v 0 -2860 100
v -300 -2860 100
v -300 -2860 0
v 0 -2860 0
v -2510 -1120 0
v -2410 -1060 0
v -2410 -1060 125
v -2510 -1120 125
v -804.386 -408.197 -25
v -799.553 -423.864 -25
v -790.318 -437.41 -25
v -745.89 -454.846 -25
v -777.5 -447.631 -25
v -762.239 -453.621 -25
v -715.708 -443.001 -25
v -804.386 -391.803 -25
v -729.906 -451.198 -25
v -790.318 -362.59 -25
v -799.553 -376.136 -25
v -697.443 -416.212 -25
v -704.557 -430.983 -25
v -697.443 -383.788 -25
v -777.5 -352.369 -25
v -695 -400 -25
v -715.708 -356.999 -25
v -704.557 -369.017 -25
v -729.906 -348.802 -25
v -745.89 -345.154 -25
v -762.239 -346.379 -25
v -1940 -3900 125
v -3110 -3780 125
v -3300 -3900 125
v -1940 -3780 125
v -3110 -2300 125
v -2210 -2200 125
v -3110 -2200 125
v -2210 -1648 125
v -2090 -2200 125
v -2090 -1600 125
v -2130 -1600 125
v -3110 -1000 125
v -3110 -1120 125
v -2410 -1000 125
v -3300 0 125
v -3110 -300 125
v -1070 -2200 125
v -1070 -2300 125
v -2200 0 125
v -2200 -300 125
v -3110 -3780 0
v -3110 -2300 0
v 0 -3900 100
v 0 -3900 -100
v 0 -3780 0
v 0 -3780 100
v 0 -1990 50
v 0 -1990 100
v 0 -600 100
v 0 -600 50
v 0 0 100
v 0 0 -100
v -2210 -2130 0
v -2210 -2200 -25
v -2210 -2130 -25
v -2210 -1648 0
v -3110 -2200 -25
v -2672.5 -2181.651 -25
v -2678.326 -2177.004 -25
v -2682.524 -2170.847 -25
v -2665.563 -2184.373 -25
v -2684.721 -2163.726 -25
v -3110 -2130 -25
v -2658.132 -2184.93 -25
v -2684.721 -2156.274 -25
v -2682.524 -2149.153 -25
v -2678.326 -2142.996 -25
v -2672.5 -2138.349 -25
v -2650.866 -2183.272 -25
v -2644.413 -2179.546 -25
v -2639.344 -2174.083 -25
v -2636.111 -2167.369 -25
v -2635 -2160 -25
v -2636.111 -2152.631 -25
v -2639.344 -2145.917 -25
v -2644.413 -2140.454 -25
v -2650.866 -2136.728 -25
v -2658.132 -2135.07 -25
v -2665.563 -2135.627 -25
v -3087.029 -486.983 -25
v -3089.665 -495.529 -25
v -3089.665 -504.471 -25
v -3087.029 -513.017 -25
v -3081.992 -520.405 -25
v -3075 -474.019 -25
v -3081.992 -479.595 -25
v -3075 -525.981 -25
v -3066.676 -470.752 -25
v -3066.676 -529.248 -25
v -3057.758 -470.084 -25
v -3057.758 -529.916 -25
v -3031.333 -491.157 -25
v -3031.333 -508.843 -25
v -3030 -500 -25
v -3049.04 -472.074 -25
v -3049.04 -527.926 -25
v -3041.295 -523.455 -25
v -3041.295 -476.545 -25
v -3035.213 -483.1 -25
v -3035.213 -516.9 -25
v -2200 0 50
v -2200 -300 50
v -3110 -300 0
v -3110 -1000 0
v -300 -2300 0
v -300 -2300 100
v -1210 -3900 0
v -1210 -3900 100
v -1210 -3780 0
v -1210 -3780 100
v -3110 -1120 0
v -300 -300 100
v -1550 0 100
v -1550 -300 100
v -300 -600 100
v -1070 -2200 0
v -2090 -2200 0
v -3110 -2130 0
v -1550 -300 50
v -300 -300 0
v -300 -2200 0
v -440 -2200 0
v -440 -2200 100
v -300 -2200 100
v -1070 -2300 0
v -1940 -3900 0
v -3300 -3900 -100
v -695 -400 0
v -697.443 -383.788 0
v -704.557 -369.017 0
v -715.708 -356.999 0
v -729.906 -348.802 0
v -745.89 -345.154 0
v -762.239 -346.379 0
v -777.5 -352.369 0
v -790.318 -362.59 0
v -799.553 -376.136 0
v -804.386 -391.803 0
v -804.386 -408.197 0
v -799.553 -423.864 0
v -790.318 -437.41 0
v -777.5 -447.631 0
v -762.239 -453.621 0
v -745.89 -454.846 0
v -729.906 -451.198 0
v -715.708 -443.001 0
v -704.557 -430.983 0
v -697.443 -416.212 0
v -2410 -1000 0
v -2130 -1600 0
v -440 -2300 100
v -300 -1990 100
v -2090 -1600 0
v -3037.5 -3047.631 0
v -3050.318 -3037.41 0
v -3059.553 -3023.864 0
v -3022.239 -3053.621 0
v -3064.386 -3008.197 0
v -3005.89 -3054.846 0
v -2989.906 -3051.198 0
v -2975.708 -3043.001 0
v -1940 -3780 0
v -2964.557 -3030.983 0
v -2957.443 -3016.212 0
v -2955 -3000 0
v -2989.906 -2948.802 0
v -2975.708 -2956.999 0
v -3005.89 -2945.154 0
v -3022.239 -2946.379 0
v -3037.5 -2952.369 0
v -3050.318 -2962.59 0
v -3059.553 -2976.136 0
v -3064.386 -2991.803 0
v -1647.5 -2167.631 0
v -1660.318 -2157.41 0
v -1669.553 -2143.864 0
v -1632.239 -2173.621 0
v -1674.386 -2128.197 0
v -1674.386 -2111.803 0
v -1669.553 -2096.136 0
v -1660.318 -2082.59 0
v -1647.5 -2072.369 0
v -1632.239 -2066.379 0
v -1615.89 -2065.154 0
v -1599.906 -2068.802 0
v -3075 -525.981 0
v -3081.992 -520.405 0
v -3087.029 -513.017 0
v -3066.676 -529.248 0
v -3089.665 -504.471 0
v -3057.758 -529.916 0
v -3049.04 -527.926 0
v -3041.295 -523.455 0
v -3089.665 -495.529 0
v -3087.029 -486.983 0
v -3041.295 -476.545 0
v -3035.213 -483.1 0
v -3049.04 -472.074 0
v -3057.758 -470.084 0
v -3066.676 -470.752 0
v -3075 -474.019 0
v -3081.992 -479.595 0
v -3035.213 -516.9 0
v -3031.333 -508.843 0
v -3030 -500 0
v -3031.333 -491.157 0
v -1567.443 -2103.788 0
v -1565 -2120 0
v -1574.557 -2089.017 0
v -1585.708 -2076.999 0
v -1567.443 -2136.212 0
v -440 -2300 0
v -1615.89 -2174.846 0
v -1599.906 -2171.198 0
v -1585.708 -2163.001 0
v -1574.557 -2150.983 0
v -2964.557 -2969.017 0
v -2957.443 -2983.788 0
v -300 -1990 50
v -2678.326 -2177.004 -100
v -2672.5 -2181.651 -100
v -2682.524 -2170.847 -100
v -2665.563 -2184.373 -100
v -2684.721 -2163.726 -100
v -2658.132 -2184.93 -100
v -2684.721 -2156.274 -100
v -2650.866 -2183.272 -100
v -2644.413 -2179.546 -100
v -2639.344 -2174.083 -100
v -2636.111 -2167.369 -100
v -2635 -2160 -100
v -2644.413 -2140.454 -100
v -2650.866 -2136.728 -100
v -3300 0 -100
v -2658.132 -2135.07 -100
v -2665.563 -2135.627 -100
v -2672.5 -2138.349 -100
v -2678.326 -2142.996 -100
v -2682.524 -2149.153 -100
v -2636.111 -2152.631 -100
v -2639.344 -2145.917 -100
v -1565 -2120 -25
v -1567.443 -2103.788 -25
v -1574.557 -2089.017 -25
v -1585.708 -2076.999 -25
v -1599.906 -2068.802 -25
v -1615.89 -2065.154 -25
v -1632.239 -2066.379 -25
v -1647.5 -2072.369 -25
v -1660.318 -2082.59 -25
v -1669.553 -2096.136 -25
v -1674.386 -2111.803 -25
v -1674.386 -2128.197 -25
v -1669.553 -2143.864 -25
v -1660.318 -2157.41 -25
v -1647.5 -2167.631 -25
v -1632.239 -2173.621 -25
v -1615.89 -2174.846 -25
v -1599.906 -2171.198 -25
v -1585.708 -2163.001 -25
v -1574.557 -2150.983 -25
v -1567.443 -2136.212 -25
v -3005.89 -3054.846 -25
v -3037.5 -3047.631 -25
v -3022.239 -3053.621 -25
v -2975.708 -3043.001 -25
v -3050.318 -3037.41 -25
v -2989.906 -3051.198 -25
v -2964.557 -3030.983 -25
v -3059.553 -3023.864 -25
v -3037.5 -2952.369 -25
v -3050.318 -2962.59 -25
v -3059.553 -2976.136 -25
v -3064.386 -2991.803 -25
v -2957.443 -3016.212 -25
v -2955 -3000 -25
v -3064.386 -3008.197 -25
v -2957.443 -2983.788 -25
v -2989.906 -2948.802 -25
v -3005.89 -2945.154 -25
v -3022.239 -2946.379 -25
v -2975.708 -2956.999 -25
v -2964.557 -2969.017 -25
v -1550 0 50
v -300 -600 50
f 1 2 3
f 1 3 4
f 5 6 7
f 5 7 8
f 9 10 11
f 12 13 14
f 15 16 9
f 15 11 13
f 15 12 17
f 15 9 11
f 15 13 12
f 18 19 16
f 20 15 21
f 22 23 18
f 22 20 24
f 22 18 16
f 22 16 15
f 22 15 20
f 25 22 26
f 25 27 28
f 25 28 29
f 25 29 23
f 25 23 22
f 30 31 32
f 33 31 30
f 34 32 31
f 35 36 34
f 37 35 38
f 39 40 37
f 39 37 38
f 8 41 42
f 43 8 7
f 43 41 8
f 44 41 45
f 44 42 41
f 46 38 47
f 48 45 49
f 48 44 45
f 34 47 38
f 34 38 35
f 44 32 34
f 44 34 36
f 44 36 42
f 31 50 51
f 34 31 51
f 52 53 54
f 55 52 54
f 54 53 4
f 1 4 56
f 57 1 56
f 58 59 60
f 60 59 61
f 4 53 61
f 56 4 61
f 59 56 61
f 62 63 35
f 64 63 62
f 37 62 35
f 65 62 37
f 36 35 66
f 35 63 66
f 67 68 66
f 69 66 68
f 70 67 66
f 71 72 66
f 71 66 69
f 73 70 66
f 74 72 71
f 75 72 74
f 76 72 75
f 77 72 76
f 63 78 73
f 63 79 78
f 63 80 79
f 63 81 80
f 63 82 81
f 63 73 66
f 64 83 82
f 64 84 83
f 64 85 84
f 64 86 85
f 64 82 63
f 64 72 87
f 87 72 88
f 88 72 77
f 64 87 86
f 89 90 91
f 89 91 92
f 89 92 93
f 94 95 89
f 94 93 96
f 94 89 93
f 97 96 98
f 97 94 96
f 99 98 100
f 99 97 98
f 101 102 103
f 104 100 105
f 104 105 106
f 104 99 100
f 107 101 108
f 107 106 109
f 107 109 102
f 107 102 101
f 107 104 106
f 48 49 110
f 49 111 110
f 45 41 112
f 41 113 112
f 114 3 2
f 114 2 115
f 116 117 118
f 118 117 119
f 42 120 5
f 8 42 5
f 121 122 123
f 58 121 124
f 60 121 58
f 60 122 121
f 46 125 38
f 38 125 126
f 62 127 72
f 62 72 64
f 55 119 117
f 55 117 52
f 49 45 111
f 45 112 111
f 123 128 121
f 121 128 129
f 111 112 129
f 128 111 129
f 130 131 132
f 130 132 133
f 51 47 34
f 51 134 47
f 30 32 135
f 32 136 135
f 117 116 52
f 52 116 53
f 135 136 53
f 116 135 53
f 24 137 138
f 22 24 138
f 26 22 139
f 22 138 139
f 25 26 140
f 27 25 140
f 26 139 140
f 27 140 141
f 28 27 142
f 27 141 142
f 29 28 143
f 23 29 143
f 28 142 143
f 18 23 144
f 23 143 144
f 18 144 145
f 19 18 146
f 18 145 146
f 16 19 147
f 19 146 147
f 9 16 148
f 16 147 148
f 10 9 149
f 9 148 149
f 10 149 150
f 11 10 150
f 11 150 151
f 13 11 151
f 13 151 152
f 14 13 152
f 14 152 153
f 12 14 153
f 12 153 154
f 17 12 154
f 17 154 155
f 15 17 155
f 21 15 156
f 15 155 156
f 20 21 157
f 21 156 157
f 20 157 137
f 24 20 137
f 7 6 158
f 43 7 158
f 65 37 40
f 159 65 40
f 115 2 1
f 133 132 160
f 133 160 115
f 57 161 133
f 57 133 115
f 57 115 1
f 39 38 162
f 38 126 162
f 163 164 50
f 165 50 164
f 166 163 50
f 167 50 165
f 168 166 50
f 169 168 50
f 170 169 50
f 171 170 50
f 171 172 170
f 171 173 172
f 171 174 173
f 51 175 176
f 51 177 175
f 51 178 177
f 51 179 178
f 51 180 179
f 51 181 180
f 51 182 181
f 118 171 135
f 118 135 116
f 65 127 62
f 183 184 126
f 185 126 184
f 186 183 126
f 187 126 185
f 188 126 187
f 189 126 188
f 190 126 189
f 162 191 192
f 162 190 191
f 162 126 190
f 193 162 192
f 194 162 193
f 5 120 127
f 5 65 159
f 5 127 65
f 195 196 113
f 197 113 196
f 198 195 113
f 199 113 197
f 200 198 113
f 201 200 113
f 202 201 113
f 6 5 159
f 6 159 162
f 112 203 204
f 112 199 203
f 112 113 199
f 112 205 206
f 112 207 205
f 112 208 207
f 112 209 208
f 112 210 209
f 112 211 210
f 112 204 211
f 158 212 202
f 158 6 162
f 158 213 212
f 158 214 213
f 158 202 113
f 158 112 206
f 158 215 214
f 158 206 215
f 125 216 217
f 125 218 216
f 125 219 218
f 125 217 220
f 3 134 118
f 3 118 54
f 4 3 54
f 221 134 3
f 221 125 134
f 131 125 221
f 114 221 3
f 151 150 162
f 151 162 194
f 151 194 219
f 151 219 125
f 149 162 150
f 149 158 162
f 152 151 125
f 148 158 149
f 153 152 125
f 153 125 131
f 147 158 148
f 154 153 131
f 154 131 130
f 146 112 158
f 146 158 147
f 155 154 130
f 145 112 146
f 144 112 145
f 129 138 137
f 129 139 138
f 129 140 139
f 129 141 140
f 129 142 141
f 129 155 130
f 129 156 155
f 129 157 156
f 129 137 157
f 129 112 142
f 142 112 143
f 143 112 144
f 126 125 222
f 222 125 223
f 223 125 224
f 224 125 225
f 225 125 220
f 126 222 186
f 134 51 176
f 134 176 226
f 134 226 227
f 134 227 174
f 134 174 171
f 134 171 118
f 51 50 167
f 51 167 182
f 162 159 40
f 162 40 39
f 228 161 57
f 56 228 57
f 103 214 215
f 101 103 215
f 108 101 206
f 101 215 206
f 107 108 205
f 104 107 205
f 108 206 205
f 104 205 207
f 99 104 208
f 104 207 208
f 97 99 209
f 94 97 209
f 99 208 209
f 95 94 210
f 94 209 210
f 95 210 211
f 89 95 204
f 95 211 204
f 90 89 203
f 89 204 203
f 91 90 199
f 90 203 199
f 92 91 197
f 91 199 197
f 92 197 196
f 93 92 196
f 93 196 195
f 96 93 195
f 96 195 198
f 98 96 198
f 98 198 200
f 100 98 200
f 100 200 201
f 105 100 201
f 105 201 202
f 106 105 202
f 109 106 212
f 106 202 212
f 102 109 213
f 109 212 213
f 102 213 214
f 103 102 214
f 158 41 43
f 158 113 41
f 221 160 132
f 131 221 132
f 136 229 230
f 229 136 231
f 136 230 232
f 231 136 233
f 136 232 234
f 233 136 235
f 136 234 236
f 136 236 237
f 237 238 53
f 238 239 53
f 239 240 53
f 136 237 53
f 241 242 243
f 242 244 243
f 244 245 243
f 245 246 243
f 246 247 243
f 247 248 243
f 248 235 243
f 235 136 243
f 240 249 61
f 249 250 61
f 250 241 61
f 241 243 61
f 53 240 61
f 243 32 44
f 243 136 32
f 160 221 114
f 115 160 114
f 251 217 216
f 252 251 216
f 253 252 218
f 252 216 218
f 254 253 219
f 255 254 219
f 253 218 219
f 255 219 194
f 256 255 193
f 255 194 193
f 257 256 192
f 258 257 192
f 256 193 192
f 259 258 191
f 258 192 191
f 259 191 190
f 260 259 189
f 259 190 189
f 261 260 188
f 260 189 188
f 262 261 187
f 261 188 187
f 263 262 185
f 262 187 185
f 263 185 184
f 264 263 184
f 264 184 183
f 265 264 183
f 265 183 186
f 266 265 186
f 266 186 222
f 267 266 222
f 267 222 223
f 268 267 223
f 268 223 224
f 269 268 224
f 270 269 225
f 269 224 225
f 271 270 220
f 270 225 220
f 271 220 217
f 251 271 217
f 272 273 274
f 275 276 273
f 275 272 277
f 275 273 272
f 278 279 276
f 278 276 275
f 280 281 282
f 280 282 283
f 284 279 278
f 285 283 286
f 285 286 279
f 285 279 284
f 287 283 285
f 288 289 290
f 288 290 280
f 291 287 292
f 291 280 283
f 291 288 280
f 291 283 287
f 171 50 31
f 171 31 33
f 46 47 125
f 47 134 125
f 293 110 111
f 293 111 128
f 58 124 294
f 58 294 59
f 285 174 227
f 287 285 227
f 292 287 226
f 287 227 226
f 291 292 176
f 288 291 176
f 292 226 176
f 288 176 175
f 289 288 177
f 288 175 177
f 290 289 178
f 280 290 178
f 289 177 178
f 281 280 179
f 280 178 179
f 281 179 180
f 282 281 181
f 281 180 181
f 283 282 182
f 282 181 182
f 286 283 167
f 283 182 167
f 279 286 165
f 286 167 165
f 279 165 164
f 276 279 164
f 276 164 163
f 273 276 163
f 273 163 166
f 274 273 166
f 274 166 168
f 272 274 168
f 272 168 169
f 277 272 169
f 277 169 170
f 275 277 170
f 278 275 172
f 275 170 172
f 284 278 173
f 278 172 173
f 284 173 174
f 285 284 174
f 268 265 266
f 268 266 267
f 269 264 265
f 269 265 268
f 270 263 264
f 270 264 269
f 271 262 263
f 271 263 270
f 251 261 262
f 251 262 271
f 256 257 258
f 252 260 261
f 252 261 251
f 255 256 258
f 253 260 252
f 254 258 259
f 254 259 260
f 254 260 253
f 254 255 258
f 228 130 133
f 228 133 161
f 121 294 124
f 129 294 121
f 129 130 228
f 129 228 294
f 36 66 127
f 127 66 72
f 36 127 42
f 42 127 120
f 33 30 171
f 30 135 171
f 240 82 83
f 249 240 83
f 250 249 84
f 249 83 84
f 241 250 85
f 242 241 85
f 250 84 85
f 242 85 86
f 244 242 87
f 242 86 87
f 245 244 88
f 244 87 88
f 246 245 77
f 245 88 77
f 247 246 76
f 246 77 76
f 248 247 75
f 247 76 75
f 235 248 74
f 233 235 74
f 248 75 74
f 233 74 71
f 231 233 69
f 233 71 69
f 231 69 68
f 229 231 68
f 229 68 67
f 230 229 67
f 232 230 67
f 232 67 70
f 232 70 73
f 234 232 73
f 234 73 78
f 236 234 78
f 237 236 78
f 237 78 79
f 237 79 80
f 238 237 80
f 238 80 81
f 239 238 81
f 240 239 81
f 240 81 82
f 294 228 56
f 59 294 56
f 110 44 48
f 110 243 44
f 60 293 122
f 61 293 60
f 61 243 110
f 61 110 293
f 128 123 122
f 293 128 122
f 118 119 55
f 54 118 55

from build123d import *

# Parameters (mm, degrees)
F0_W      = 3300
F0_H      = 3900
F1_DEPTH  = 100
F2_W      = 3300
F2_H      = 3900
F2_W_2    = 2810
F2_H_2    = 1480
F2_W_3    = 1560
F2_H_3    = 1900
F2_W_4    = 1150
F3_DEPTH  = 100
F4_W      = 630
F4_H      = 100
F4_W_2    = 300
F4_H_2    = 920
F4_W_3    = 730
F4_H_3    = 120
F5_DEPTH  = 100
F4_W_4    = 650
F4_H_4    = 300
F4_H_5    = 1390
F6_DEPTH  = 50
F7_W      = 100
F7_H      = 1900
F8_DEPTH  = 100
F9_W      = 630
F9_H      = 100
F10_DEPTH = 100
F11_W     = 700
F11_H     = 120
F12_DEPTH = 100
F13_W     = 120
F13_H     = 600
F14_DEPTH = 100
F15_DEPTH = 25
F17_DEPTH = 125
F18_R     = 55
F18_R_2   = 30
F18_W     = 900
F18_H     = 70
F19_DEPTH = 25
F20_R     = 25
F21_DEPTH = 100


with BuildPart() as f1:
    # F0 (on Top) → F1 (new body)
    with BuildSketch(Plane.XY):
        with Locations((-1650, -1950)):
            Rectangle(F0_W, F0_H)
    extrude(amount=-F1_DEPTH)

    # F2 (on face) → F3 (join)
    with BuildSketch(Plane.XY):
        with Locations((-1650, -1950)):
            Rectangle(F2_W, F2_H)
        with Locations((-1705, -3040)):
            Rectangle(F2_W_2, F2_H_2, mode=Mode.SUBTRACT)
        with Locations((-2330, -1250)):
            Rectangle(F2_W_3, F2_H_3, mode=Mode.SUBTRACT)
        with Locations((-875, -1250)):
            Rectangle(F2_W_4, F2_H_3, mode=Mode.SUBTRACT)
    extrude(amount=F3_DEPTH)

    # F4 (on face) → F5 (cut, through all)
    with BuildSketch(Plane.XY.offset(100)):
        with Locations((-2085, -2250)):
            Rectangle(F4_W, F4_H)
        with Locations((-755, -2250)):
            Rectangle(F4_W, F4_H)
        with Locations((-150, -3320)):
            Rectangle(F4_W_2, F4_H_2)
        with Locations((-1575, -3840)):
            Rectangle(F4_W_3, F4_H_3)
    extrude(amount=-F5_DEPTH, mode=Mode.SUBTRACT)

    # F4 (on face) → F6 (cut)
    with BuildSketch(Plane.XY.offset(100)):
        with Locations((-1875, -150)):
            Rectangle(F4_W_4, F4_H_4)
        with Locations((-150, -1295)):
            Rectangle(F4_W_2, F4_H_5)
    extrude(amount=-F6_DEPTH, mode=Mode.SUBTRACT)

    # F7 (on face) → F8 (cut, through all)
    with BuildSketch(Plane.XY.offset(100)):
        with Locations((-1500, -1250)):
            Rectangle(F7_W, F7_H)
    extrude(amount=-F8_DEPTH, mode=Mode.SUBTRACT)

    # F9 (on face) → F10 (join, through all)
    with BuildSketch(Plane.XY):
        with Locations((-2085, -2250)):
            Rectangle(F9_W, F9_H)
    extrude(amount=F10_DEPTH)

    # F11 (on face) → F12 (join, through all)
    with BuildSketch(Plane.XY):
        with Locations((-2760, -1060)):
            Rectangle(F11_W, F11_H)
    extrude(amount=F12_DEPTH)

    # F13 (on face) → F14 (join, through all)
    with BuildSketch(Plane.XY):
        with Locations((-2150, -1900)):
            Rectangle(F13_W, F13_H)
    extrude(amount=F14_DEPTH)

    # F15 (add): a face of the model
    f15_faces = [f1.faces().sort_by_distance(p)[0] for p in [
        (-2244.9253825805, -150, 100),
    ]]
    extrude(f15_faces, amount=F15_DEPTH)

    # F16 (on face) → F17 (cut, through all)
    with BuildSketch(Plane.XY.offset(125)):
        Polygon((-2410, -1120), (-2410, -1060), (-2510, -1120), align=None)
        Polygon((-2210, -1648), (-2130, -1600), (-2210, -1600), align=None)
    extrude(amount=-F17_DEPTH, mode=Mode.SUBTRACT)

    # F18 (on face) → F19 (cut)
    with BuildSketch(Plane.XY):
        with Locations((-750, -400)):
            Circle(F18_R)
        with Locations((-3060, -500)):
            Circle(F18_R_2)
        with Locations((-1620, -2120)):
            Circle(F18_R)
        with Locations((-3010, -3000)):
            Circle(F18_R)
        with Locations((-2660, -2165)):
            Rectangle(F18_W, F18_H)
    extrude(amount=-F19_DEPTH, mode=Mode.SUBTRACT)

    # F20 (on face) → F21 (cut)
    with BuildSketch(Plane.XY):
        with Locations((-2660, -2160)):
            Circle(F20_R)
    extrude(amount=-F21_DEPTH, mode=Mode.SUBTRACT)


solid = f1.part
